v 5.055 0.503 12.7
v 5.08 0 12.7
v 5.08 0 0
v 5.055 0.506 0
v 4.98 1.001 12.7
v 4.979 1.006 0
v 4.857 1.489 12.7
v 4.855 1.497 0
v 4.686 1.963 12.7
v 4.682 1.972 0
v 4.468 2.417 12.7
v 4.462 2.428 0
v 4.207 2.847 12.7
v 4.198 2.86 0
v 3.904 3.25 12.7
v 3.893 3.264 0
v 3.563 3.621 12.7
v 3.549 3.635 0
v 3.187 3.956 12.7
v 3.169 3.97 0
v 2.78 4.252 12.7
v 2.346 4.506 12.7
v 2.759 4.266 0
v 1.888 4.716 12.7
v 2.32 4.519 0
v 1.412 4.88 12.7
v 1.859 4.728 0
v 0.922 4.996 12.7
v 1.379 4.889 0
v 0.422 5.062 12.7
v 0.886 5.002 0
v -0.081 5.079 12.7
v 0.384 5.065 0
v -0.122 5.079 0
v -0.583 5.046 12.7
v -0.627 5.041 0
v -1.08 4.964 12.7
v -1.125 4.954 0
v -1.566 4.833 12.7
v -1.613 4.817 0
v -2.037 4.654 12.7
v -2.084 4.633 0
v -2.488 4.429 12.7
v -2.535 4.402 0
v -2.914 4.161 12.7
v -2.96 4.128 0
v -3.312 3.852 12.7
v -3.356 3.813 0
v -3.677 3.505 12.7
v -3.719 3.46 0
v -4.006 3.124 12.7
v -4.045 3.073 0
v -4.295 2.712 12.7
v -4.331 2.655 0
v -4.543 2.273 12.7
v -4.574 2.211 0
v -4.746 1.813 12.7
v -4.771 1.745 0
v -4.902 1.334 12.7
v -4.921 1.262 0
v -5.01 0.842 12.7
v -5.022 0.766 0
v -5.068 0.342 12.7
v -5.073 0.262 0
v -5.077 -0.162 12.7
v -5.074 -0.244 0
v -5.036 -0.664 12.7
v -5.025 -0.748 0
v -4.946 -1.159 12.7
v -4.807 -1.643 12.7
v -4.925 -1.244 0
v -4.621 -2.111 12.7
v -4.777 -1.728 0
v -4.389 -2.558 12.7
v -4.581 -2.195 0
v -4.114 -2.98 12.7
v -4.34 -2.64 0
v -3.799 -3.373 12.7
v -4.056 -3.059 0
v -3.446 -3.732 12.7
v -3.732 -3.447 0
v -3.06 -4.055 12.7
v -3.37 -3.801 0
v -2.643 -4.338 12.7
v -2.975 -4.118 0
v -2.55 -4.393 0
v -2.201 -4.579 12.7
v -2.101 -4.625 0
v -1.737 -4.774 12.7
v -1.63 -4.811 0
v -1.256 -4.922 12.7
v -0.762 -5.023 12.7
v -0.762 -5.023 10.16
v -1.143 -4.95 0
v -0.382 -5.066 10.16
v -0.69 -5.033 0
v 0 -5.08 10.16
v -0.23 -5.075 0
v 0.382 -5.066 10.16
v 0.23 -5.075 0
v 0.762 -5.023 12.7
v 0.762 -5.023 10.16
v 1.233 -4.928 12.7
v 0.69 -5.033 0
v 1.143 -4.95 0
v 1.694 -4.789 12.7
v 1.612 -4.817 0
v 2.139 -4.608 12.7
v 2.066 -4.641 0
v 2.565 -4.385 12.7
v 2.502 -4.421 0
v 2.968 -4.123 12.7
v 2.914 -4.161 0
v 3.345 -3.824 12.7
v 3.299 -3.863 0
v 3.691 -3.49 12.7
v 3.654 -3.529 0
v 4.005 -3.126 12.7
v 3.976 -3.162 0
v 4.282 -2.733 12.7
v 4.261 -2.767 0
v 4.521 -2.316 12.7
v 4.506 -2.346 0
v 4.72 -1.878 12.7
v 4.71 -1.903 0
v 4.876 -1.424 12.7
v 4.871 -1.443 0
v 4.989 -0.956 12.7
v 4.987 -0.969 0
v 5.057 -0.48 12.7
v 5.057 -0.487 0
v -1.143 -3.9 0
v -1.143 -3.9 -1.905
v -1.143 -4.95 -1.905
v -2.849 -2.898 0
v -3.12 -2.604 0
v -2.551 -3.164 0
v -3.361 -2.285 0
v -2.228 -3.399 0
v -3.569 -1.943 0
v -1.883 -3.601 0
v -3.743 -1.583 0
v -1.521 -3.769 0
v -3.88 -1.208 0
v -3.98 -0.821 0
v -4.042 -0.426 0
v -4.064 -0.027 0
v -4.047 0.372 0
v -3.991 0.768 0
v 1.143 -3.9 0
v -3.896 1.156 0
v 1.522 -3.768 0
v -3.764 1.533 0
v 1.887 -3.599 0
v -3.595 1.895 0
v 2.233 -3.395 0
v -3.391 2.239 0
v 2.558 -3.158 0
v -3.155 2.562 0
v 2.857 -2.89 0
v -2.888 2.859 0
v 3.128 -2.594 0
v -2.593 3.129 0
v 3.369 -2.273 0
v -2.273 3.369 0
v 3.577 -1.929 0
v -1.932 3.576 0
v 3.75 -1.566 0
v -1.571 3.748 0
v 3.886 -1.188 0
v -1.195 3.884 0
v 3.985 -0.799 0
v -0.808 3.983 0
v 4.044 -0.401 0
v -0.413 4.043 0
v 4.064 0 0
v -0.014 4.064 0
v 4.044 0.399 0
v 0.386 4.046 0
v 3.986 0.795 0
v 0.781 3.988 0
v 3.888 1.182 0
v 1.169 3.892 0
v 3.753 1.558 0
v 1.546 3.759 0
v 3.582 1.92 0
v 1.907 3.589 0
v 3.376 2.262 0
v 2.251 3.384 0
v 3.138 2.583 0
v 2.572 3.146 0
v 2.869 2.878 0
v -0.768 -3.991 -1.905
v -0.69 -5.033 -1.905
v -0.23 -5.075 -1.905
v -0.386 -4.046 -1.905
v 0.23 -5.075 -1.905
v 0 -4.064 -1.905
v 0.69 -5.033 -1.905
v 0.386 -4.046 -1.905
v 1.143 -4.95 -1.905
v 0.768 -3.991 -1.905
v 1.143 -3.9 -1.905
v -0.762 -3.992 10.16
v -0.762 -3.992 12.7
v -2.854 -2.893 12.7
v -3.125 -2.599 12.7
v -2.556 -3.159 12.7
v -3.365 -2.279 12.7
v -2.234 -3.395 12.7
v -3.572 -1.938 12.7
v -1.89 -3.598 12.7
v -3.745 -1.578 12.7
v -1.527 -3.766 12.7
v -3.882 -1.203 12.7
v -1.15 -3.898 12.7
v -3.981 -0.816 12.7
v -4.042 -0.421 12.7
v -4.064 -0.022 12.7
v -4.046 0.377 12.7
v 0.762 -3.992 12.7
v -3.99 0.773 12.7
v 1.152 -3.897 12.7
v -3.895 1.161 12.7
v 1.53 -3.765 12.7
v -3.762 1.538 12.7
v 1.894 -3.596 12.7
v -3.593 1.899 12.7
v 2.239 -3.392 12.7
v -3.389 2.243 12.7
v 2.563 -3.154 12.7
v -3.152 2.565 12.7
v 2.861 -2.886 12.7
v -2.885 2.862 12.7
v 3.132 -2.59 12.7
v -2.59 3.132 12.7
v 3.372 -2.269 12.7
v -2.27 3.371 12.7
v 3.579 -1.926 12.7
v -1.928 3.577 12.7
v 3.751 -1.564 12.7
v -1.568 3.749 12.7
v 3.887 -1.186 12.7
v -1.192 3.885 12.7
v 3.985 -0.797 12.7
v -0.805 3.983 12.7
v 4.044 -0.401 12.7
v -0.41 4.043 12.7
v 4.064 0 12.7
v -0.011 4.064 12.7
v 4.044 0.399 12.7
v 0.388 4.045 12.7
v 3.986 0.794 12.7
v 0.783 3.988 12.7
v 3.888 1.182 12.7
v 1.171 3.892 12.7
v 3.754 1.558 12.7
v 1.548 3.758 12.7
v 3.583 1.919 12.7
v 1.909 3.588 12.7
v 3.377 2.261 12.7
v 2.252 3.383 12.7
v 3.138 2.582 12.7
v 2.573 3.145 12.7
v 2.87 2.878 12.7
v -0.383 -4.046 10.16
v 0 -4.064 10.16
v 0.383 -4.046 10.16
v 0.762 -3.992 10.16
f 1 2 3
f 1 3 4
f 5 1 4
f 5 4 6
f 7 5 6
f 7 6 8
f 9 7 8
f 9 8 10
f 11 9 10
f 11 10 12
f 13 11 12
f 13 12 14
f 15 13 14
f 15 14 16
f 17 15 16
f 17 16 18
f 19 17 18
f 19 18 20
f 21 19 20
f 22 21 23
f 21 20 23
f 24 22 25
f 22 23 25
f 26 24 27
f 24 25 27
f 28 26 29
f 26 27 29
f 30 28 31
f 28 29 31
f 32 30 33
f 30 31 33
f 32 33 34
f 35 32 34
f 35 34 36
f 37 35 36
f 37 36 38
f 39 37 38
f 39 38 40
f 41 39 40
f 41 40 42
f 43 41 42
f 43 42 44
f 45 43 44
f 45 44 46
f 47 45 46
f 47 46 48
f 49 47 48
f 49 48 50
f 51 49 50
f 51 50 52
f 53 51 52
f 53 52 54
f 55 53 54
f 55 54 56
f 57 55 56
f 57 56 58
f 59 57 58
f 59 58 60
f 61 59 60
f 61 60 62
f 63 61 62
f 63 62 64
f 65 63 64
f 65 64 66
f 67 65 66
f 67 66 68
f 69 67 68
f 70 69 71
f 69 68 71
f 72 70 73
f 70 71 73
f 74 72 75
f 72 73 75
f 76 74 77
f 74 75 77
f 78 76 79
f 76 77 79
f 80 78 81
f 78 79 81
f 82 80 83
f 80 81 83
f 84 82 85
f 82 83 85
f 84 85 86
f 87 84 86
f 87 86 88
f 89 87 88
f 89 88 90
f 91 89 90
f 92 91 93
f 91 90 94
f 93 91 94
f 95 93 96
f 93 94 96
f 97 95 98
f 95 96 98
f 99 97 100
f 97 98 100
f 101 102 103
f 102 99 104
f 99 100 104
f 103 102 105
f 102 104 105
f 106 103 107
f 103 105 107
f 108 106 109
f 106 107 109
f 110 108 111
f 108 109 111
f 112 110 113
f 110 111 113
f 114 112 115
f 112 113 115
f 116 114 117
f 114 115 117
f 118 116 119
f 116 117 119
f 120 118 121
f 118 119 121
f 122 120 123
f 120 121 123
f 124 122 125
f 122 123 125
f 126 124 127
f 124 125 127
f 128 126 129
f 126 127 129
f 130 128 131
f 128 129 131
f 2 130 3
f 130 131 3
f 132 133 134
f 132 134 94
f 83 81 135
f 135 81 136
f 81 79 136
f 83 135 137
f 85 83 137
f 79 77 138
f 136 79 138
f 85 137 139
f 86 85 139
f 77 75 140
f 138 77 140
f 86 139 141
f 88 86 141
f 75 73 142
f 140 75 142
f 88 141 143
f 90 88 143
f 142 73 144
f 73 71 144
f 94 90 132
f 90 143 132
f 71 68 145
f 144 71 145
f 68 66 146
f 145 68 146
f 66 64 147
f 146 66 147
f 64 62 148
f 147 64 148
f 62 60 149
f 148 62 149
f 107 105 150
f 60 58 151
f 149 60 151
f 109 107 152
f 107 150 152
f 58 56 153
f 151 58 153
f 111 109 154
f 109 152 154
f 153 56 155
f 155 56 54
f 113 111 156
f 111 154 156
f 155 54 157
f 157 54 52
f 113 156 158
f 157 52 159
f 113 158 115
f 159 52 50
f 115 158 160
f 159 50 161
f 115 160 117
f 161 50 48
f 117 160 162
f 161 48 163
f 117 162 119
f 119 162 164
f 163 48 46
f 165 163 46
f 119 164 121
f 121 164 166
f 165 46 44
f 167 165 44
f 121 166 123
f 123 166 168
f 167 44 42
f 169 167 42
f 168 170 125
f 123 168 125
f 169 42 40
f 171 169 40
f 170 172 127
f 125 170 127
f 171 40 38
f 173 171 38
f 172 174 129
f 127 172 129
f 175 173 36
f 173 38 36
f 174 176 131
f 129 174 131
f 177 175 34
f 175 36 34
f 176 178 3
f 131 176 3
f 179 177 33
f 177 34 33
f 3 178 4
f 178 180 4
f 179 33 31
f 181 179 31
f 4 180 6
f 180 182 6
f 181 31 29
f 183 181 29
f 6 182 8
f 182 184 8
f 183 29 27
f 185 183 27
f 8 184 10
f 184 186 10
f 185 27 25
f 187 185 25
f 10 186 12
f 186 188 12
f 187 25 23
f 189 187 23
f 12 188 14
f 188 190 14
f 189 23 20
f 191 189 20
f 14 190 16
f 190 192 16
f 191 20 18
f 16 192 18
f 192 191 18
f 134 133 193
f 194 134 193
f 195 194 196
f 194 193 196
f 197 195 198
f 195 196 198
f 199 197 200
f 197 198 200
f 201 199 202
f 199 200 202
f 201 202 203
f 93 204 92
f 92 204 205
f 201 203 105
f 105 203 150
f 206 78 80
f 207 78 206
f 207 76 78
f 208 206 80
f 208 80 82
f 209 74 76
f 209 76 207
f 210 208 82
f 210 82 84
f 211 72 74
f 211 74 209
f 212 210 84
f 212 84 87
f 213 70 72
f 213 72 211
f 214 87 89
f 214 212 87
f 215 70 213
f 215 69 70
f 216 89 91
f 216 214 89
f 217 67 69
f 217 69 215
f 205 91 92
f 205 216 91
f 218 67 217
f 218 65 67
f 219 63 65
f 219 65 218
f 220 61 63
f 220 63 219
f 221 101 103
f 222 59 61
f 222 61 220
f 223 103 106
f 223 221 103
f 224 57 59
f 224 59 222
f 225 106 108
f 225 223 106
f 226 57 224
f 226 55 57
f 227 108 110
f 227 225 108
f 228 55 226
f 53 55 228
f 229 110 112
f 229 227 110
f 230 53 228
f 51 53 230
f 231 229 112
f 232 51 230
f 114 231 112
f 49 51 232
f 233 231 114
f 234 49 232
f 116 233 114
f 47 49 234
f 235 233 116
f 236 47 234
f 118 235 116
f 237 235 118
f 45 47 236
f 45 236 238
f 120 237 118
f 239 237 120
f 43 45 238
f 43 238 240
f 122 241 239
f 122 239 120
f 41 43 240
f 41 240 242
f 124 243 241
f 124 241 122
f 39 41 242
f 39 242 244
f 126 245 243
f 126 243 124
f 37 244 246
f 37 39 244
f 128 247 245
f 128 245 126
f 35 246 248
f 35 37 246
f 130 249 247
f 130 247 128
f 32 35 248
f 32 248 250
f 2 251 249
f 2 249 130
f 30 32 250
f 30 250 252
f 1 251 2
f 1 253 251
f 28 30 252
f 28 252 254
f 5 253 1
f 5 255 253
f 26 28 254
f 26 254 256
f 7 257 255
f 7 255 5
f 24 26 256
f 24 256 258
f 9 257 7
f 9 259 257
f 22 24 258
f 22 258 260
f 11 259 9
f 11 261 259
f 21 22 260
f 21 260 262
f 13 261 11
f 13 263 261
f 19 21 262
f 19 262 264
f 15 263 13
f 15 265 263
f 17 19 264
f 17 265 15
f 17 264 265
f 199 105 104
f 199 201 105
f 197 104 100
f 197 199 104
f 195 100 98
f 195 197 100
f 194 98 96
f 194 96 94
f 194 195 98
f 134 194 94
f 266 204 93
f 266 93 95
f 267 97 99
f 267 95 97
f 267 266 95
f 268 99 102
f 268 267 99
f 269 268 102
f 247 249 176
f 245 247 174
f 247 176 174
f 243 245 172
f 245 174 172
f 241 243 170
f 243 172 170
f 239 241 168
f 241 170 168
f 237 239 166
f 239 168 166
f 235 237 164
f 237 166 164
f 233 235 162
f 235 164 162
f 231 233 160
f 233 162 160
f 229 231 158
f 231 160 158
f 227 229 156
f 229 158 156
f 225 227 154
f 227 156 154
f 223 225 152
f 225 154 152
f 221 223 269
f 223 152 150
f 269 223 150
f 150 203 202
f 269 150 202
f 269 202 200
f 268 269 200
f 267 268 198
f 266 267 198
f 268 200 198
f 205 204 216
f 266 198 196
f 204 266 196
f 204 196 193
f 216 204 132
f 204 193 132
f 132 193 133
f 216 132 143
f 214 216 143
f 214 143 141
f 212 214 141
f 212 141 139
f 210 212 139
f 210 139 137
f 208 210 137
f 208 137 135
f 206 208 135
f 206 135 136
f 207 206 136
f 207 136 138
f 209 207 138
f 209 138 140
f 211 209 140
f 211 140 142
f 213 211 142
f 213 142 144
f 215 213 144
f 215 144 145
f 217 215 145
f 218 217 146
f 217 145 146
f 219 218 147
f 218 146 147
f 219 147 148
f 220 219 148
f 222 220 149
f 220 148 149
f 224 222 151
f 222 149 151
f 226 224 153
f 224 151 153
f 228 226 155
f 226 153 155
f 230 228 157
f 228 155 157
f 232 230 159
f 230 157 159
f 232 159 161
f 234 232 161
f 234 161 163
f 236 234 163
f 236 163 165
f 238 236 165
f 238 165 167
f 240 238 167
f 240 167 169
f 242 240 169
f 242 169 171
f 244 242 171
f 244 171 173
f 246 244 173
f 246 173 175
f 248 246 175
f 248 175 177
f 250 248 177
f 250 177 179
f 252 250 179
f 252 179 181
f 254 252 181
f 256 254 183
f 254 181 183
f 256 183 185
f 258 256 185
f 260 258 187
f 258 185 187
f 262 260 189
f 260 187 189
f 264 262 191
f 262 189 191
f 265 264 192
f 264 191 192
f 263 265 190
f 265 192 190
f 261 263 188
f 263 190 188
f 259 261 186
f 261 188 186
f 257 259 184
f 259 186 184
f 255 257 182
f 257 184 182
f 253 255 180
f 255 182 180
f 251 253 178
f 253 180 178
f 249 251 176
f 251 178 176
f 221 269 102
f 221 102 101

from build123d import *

# Parameters (mm, degrees)
F0_R          = 5.08
F0_R_2        = 4.064
F1_DEPTH      = 12.7
F2_W          = 1.524
F2_H          = 2.54
F3_DEPTH      = 25.4
F5_END_RADIUS = 5.08
F4_W          = 2.286
F4_H          = 1.905
F5_REACH      = 8.0567051265
F6_END_RADIUS = 4.064
F6_REACH      = 8.0567051265


with BuildPart() as f1:
    # F0 (on Top) → F1 (new body)
    with BuildSketch(Plane.XY):
        Circle(F0_R)
        Circle(F0_R_2, mode=Mode.SUBTRACT)
    extrude(amount=F1_DEPTH)

    # F2 (on Front) → F3 (cut)
    with BuildSketch(Plane.XZ):
        with Locations((0, 11.43)):
            Rectangle(F2_W, F2_H)
    extrude(amount=F3_DEPTH, mode=Mode.SUBTRACT)

    f5_end = (Plane(origin=(0, 0, 6.35), x_dir=(-1, 0, 0), z_dir=(0, 0, -1)) * Cylinder(F5_END_RADIUS, 54.4665691842, mode=Mode.PRIVATE)).faces().sort_by_distance((-5.08, 0, 6.35))[0]
    # F4 (on Front) → F5 (join, up to the whole of a round face its end follows)
    with BuildSketch(Plane.XZ):
        with Locations((0, -0.9525)):
            Rectangle(F4_W, F4_H)
    f5_long = extrude(amount=F5_REACH, mode=Mode.PRIVATE)
    add(split(f5_long, bisect_by=f5_end, keep=Keep.BOTTOM, mode=Mode.PRIVATE))

    f6_end = (Plane(origin=(0, 0, 6.35), x_dir=(-1, 0, 0), z_dir=(0, 0, -1)) * Cylinder(F6_END_RADIUS, 57.0893653975, mode=Mode.PRIVATE)).faces().sort_by_distance((-4.064, 0, 6.35))[0]
    # F4 (on Front) → F6 (cut, up to the whole of a round face its end follows)
    with BuildSketch(Plane.XZ):
        with Locations((0, -0.9525)):
            Rectangle(F4_W, F4_H)
    f6_long = extrude(amount=F6_REACH, mode=Mode.PRIVATE)
    add(split(f6_long, bisect_by=f6_end, keep=Keep.BOTTOM, mode=Mode.PRIVATE), mode=Mode.SUBTRACT)


solid = f1.part
